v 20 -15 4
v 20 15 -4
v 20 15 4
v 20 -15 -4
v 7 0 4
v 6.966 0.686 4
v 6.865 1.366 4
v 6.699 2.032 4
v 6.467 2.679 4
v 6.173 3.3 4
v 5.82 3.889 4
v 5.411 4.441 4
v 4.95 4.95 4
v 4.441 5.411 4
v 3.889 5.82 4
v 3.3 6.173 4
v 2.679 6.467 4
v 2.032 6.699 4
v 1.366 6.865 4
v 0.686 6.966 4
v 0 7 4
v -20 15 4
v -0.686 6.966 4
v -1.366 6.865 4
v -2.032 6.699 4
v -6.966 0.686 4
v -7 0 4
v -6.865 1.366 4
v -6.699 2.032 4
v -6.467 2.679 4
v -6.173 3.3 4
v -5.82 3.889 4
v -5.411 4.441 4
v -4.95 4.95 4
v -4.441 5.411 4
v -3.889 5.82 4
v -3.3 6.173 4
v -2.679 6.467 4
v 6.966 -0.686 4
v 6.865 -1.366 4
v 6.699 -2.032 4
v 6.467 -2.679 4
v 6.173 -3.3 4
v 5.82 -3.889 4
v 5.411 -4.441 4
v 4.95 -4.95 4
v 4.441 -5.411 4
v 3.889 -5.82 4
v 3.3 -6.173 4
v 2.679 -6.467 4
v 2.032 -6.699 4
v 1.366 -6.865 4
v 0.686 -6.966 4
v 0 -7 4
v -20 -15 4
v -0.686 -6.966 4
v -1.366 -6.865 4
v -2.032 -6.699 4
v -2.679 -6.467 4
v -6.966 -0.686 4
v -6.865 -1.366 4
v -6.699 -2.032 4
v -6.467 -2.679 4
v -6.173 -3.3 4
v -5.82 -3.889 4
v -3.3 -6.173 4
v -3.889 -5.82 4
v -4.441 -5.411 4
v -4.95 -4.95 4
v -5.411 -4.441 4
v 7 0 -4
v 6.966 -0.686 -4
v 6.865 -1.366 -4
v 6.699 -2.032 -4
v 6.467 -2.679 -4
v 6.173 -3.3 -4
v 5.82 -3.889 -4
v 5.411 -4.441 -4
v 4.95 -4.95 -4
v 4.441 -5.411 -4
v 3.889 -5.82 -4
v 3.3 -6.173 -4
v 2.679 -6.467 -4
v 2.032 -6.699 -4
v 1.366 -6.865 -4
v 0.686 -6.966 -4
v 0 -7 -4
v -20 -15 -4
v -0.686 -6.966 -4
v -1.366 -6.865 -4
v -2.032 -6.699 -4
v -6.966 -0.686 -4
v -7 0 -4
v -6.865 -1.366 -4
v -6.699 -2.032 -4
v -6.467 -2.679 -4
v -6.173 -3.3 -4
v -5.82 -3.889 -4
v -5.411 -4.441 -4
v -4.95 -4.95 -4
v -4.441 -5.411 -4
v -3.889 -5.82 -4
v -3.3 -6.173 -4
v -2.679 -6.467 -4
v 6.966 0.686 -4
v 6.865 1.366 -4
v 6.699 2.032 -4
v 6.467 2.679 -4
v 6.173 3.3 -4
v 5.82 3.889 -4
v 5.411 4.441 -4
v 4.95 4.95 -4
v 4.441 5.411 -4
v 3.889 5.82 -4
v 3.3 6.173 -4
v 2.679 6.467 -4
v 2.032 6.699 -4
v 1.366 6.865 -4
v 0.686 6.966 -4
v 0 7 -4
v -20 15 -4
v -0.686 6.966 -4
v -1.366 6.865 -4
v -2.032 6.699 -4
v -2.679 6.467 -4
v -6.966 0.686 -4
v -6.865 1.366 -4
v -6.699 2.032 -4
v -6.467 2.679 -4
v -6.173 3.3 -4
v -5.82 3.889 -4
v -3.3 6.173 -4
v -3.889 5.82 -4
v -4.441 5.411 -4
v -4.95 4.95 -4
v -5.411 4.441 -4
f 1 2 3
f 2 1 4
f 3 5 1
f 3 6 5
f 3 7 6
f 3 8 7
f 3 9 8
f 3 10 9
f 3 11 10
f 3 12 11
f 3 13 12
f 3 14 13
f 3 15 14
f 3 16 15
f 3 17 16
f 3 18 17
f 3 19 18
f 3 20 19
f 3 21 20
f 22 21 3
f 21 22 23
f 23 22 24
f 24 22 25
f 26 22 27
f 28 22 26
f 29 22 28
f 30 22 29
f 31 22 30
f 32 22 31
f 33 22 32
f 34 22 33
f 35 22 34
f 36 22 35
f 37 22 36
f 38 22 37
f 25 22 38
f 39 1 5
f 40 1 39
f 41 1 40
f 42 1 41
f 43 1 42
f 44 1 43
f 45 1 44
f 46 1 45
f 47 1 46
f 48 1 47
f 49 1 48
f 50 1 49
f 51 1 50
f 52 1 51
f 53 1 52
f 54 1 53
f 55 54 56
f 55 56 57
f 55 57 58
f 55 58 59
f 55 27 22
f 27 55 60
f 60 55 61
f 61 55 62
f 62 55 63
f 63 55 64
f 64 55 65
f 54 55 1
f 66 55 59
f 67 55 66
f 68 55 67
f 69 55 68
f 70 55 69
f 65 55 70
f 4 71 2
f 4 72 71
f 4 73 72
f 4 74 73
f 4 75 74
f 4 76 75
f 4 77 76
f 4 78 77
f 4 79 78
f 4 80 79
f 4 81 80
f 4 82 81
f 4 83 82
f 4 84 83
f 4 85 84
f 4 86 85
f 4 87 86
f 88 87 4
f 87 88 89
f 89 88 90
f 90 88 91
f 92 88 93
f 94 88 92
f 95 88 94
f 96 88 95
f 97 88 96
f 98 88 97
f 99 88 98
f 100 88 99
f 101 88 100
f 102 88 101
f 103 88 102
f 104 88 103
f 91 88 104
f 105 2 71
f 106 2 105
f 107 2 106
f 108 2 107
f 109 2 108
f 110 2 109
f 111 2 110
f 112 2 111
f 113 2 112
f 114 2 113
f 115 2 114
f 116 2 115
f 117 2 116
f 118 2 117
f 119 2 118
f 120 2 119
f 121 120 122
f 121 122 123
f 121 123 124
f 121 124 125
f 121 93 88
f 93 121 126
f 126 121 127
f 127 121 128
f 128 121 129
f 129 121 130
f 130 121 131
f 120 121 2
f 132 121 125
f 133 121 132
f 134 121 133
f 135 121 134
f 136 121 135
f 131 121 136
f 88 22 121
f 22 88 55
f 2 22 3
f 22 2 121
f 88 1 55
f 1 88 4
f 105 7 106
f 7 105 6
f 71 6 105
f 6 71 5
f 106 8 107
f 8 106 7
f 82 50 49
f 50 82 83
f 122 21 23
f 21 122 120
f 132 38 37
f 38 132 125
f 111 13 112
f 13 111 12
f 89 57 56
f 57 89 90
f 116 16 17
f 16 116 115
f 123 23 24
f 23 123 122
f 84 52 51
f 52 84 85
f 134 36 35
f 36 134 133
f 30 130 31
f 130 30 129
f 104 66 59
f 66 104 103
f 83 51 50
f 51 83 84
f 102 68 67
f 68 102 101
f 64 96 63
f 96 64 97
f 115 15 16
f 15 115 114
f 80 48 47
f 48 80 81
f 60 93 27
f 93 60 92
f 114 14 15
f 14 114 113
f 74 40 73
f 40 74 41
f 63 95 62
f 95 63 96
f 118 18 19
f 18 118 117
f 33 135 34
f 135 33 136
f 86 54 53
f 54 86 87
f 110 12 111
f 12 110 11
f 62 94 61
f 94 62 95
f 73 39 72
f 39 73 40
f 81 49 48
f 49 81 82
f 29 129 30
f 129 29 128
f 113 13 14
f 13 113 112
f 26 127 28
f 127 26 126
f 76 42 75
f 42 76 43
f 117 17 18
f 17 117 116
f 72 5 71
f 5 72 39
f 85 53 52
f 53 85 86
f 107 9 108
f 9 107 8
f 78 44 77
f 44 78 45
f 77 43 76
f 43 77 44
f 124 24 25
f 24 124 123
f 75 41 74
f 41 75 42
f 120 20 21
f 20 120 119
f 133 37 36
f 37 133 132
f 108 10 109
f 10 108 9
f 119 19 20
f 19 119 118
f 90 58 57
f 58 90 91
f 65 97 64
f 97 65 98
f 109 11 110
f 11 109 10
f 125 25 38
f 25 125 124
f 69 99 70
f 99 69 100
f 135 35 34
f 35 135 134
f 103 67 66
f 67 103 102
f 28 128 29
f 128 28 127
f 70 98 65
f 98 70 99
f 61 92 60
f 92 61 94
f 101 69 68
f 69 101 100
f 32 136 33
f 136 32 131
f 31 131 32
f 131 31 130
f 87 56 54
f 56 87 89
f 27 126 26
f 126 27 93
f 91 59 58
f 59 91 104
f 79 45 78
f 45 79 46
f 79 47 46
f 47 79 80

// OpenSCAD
// A plate with a circular hole, made from two primitive solids.

$fn = 64;

difference() {
    cube([40, 30, 8], center = true);
    cylinder(h = 12, d = 14, center = true);
}
